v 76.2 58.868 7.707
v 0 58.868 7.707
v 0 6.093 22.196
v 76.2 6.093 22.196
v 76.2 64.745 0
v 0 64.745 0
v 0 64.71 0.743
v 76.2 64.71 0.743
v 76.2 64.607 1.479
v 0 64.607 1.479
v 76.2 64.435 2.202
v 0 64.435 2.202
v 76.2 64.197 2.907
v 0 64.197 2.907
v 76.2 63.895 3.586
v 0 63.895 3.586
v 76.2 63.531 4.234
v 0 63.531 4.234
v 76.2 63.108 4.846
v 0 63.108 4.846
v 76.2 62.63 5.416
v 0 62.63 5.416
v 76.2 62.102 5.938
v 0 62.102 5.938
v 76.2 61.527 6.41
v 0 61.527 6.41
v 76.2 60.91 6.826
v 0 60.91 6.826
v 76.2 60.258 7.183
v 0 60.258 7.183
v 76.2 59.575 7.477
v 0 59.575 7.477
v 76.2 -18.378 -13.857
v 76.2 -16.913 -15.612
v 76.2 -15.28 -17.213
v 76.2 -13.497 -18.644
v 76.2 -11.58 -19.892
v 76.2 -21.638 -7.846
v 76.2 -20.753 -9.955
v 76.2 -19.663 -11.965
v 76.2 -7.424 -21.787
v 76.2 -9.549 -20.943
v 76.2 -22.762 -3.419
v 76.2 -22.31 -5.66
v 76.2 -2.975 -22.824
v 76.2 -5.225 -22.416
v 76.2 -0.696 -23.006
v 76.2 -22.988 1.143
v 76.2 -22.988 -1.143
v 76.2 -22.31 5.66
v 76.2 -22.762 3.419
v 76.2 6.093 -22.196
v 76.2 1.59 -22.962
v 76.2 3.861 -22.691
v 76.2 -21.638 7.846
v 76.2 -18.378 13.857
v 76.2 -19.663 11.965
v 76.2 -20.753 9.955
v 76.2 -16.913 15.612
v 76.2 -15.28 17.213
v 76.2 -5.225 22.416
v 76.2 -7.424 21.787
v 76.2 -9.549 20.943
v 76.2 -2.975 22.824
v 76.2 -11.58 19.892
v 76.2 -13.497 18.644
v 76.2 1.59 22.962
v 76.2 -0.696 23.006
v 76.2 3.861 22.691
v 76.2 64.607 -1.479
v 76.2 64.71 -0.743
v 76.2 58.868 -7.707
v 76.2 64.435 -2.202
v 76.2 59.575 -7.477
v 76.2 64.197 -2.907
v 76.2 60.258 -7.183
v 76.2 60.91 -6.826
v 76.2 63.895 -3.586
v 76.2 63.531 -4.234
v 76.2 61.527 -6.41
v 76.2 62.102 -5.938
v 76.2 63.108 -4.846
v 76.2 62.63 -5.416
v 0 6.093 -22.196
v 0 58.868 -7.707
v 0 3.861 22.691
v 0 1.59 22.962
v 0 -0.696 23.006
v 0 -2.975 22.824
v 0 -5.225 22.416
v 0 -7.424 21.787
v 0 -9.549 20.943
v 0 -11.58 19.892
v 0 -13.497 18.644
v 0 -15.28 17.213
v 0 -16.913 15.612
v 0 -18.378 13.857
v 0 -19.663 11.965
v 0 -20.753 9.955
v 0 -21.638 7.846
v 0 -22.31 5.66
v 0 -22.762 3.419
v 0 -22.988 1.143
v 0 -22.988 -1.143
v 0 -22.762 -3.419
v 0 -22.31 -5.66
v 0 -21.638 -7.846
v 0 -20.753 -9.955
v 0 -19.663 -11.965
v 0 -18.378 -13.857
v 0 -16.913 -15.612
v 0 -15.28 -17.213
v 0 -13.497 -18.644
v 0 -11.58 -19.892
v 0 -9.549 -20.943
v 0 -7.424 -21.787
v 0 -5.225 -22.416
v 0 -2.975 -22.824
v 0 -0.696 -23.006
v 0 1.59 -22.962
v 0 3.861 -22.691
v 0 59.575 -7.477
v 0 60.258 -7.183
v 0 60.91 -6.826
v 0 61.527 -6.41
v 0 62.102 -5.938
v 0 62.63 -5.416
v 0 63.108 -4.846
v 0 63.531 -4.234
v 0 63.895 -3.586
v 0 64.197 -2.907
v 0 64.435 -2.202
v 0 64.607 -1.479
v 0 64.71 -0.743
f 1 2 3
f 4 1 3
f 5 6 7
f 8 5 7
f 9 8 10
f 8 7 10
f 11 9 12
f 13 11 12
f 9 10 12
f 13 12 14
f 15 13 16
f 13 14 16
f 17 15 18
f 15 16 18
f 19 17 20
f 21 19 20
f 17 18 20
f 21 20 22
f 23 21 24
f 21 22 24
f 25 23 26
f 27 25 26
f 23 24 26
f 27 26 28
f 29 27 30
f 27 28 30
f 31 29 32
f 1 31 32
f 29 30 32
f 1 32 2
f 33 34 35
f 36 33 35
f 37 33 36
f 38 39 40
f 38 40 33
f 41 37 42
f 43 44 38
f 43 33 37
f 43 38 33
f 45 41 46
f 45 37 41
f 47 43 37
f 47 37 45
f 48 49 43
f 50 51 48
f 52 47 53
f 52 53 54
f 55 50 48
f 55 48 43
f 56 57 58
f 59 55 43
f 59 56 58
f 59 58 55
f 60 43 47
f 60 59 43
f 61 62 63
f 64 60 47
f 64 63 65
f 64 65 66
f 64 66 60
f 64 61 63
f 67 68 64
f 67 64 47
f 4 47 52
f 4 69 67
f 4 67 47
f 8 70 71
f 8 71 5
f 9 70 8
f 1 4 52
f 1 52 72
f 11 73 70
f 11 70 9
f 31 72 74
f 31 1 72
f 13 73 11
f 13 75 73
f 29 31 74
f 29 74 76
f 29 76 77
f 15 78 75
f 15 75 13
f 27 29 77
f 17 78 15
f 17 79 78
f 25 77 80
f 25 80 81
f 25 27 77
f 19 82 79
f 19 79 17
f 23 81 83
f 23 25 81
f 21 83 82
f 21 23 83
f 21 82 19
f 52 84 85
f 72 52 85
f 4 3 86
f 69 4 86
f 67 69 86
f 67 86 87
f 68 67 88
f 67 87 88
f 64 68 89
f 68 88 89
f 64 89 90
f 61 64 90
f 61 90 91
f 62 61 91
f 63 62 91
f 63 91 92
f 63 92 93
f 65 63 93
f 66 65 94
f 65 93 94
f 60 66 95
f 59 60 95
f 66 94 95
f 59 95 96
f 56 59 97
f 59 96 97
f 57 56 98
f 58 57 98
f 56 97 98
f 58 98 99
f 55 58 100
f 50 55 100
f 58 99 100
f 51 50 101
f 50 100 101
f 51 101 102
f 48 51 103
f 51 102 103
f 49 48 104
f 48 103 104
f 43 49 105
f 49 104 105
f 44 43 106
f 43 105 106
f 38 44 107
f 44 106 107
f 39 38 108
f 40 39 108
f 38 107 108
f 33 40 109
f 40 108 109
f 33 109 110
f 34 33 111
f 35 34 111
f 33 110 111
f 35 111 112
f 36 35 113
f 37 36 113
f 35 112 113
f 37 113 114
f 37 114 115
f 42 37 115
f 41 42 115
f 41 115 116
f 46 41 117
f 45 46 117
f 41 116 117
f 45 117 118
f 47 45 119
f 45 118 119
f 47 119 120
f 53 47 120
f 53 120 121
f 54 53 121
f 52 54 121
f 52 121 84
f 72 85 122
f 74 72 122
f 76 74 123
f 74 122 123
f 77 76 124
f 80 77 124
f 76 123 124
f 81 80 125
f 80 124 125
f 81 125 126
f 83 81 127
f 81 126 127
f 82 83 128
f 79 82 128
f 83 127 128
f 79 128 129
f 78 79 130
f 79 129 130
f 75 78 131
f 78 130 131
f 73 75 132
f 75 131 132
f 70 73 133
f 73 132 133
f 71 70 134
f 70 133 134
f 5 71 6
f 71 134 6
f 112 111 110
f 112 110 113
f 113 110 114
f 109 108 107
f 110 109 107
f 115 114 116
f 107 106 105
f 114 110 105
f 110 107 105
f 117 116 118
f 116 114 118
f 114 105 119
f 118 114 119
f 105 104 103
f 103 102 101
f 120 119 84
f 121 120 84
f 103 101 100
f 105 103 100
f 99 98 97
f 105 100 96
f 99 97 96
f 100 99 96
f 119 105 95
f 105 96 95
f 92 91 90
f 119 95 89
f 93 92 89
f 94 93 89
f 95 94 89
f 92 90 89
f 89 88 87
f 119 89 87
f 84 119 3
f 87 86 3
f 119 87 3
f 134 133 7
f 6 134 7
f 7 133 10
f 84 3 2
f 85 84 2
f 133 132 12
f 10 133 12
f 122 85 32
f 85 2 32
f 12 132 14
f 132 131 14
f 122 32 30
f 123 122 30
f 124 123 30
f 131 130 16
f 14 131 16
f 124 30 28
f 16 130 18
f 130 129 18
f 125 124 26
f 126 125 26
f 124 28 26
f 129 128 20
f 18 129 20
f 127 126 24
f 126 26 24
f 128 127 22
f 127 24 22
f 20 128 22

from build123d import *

# Parameters (mm, degrees)
F1_DEPTH = 76.2


with BuildPart() as f1:
    # F0 (on Right) → F1 (new body)
    with BuildSketch(Plane.YZ):
        with BuildLine():
            ThreePointArc((64.744801, 0), (63.108078, 4.846023), (58.868258, 7.70727))
            ThreePointArc((58.868258, 7.70727), (48.759932, 0), (58.868258, -7.70727))
            ThreePointArc((58.868258, -7.70727), (63.108078, -4.846023), (64.744801, 0))
        make_face()
        with BuildLine():
            ThreePointArc((6.093416, -22.195651), (18.303388, -13.955738), (23.016877, 0))
            ThreePointArc((23.016877, 0), (18.303388, 13.955738), (6.093416, 22.195651))
            ThreePointArc((6.093416, 22.195651), (-23.016877, 0), (6.093416, -22.195651))
        make_face()
        with BuildLine():
            ThreePointArc((6.093416, 22.195651), (18.303388, 13.955738), (23.016877, 0))
            ThreePointArc((23.016877, 0), (18.303388, -13.955738), (6.093416, -22.195651))
            Line((6.093416, -22.195651), (58.868258, -7.70727))
            ThreePointArc((58.868258, -7.70727), (48.759932, 0), (58.868258, 7.70727))
            Line((58.868258, 7.70727), (6.093416, 22.195651))
        make_face()
    extrude(amount=F1_DEPTH)


solid = f1.part
